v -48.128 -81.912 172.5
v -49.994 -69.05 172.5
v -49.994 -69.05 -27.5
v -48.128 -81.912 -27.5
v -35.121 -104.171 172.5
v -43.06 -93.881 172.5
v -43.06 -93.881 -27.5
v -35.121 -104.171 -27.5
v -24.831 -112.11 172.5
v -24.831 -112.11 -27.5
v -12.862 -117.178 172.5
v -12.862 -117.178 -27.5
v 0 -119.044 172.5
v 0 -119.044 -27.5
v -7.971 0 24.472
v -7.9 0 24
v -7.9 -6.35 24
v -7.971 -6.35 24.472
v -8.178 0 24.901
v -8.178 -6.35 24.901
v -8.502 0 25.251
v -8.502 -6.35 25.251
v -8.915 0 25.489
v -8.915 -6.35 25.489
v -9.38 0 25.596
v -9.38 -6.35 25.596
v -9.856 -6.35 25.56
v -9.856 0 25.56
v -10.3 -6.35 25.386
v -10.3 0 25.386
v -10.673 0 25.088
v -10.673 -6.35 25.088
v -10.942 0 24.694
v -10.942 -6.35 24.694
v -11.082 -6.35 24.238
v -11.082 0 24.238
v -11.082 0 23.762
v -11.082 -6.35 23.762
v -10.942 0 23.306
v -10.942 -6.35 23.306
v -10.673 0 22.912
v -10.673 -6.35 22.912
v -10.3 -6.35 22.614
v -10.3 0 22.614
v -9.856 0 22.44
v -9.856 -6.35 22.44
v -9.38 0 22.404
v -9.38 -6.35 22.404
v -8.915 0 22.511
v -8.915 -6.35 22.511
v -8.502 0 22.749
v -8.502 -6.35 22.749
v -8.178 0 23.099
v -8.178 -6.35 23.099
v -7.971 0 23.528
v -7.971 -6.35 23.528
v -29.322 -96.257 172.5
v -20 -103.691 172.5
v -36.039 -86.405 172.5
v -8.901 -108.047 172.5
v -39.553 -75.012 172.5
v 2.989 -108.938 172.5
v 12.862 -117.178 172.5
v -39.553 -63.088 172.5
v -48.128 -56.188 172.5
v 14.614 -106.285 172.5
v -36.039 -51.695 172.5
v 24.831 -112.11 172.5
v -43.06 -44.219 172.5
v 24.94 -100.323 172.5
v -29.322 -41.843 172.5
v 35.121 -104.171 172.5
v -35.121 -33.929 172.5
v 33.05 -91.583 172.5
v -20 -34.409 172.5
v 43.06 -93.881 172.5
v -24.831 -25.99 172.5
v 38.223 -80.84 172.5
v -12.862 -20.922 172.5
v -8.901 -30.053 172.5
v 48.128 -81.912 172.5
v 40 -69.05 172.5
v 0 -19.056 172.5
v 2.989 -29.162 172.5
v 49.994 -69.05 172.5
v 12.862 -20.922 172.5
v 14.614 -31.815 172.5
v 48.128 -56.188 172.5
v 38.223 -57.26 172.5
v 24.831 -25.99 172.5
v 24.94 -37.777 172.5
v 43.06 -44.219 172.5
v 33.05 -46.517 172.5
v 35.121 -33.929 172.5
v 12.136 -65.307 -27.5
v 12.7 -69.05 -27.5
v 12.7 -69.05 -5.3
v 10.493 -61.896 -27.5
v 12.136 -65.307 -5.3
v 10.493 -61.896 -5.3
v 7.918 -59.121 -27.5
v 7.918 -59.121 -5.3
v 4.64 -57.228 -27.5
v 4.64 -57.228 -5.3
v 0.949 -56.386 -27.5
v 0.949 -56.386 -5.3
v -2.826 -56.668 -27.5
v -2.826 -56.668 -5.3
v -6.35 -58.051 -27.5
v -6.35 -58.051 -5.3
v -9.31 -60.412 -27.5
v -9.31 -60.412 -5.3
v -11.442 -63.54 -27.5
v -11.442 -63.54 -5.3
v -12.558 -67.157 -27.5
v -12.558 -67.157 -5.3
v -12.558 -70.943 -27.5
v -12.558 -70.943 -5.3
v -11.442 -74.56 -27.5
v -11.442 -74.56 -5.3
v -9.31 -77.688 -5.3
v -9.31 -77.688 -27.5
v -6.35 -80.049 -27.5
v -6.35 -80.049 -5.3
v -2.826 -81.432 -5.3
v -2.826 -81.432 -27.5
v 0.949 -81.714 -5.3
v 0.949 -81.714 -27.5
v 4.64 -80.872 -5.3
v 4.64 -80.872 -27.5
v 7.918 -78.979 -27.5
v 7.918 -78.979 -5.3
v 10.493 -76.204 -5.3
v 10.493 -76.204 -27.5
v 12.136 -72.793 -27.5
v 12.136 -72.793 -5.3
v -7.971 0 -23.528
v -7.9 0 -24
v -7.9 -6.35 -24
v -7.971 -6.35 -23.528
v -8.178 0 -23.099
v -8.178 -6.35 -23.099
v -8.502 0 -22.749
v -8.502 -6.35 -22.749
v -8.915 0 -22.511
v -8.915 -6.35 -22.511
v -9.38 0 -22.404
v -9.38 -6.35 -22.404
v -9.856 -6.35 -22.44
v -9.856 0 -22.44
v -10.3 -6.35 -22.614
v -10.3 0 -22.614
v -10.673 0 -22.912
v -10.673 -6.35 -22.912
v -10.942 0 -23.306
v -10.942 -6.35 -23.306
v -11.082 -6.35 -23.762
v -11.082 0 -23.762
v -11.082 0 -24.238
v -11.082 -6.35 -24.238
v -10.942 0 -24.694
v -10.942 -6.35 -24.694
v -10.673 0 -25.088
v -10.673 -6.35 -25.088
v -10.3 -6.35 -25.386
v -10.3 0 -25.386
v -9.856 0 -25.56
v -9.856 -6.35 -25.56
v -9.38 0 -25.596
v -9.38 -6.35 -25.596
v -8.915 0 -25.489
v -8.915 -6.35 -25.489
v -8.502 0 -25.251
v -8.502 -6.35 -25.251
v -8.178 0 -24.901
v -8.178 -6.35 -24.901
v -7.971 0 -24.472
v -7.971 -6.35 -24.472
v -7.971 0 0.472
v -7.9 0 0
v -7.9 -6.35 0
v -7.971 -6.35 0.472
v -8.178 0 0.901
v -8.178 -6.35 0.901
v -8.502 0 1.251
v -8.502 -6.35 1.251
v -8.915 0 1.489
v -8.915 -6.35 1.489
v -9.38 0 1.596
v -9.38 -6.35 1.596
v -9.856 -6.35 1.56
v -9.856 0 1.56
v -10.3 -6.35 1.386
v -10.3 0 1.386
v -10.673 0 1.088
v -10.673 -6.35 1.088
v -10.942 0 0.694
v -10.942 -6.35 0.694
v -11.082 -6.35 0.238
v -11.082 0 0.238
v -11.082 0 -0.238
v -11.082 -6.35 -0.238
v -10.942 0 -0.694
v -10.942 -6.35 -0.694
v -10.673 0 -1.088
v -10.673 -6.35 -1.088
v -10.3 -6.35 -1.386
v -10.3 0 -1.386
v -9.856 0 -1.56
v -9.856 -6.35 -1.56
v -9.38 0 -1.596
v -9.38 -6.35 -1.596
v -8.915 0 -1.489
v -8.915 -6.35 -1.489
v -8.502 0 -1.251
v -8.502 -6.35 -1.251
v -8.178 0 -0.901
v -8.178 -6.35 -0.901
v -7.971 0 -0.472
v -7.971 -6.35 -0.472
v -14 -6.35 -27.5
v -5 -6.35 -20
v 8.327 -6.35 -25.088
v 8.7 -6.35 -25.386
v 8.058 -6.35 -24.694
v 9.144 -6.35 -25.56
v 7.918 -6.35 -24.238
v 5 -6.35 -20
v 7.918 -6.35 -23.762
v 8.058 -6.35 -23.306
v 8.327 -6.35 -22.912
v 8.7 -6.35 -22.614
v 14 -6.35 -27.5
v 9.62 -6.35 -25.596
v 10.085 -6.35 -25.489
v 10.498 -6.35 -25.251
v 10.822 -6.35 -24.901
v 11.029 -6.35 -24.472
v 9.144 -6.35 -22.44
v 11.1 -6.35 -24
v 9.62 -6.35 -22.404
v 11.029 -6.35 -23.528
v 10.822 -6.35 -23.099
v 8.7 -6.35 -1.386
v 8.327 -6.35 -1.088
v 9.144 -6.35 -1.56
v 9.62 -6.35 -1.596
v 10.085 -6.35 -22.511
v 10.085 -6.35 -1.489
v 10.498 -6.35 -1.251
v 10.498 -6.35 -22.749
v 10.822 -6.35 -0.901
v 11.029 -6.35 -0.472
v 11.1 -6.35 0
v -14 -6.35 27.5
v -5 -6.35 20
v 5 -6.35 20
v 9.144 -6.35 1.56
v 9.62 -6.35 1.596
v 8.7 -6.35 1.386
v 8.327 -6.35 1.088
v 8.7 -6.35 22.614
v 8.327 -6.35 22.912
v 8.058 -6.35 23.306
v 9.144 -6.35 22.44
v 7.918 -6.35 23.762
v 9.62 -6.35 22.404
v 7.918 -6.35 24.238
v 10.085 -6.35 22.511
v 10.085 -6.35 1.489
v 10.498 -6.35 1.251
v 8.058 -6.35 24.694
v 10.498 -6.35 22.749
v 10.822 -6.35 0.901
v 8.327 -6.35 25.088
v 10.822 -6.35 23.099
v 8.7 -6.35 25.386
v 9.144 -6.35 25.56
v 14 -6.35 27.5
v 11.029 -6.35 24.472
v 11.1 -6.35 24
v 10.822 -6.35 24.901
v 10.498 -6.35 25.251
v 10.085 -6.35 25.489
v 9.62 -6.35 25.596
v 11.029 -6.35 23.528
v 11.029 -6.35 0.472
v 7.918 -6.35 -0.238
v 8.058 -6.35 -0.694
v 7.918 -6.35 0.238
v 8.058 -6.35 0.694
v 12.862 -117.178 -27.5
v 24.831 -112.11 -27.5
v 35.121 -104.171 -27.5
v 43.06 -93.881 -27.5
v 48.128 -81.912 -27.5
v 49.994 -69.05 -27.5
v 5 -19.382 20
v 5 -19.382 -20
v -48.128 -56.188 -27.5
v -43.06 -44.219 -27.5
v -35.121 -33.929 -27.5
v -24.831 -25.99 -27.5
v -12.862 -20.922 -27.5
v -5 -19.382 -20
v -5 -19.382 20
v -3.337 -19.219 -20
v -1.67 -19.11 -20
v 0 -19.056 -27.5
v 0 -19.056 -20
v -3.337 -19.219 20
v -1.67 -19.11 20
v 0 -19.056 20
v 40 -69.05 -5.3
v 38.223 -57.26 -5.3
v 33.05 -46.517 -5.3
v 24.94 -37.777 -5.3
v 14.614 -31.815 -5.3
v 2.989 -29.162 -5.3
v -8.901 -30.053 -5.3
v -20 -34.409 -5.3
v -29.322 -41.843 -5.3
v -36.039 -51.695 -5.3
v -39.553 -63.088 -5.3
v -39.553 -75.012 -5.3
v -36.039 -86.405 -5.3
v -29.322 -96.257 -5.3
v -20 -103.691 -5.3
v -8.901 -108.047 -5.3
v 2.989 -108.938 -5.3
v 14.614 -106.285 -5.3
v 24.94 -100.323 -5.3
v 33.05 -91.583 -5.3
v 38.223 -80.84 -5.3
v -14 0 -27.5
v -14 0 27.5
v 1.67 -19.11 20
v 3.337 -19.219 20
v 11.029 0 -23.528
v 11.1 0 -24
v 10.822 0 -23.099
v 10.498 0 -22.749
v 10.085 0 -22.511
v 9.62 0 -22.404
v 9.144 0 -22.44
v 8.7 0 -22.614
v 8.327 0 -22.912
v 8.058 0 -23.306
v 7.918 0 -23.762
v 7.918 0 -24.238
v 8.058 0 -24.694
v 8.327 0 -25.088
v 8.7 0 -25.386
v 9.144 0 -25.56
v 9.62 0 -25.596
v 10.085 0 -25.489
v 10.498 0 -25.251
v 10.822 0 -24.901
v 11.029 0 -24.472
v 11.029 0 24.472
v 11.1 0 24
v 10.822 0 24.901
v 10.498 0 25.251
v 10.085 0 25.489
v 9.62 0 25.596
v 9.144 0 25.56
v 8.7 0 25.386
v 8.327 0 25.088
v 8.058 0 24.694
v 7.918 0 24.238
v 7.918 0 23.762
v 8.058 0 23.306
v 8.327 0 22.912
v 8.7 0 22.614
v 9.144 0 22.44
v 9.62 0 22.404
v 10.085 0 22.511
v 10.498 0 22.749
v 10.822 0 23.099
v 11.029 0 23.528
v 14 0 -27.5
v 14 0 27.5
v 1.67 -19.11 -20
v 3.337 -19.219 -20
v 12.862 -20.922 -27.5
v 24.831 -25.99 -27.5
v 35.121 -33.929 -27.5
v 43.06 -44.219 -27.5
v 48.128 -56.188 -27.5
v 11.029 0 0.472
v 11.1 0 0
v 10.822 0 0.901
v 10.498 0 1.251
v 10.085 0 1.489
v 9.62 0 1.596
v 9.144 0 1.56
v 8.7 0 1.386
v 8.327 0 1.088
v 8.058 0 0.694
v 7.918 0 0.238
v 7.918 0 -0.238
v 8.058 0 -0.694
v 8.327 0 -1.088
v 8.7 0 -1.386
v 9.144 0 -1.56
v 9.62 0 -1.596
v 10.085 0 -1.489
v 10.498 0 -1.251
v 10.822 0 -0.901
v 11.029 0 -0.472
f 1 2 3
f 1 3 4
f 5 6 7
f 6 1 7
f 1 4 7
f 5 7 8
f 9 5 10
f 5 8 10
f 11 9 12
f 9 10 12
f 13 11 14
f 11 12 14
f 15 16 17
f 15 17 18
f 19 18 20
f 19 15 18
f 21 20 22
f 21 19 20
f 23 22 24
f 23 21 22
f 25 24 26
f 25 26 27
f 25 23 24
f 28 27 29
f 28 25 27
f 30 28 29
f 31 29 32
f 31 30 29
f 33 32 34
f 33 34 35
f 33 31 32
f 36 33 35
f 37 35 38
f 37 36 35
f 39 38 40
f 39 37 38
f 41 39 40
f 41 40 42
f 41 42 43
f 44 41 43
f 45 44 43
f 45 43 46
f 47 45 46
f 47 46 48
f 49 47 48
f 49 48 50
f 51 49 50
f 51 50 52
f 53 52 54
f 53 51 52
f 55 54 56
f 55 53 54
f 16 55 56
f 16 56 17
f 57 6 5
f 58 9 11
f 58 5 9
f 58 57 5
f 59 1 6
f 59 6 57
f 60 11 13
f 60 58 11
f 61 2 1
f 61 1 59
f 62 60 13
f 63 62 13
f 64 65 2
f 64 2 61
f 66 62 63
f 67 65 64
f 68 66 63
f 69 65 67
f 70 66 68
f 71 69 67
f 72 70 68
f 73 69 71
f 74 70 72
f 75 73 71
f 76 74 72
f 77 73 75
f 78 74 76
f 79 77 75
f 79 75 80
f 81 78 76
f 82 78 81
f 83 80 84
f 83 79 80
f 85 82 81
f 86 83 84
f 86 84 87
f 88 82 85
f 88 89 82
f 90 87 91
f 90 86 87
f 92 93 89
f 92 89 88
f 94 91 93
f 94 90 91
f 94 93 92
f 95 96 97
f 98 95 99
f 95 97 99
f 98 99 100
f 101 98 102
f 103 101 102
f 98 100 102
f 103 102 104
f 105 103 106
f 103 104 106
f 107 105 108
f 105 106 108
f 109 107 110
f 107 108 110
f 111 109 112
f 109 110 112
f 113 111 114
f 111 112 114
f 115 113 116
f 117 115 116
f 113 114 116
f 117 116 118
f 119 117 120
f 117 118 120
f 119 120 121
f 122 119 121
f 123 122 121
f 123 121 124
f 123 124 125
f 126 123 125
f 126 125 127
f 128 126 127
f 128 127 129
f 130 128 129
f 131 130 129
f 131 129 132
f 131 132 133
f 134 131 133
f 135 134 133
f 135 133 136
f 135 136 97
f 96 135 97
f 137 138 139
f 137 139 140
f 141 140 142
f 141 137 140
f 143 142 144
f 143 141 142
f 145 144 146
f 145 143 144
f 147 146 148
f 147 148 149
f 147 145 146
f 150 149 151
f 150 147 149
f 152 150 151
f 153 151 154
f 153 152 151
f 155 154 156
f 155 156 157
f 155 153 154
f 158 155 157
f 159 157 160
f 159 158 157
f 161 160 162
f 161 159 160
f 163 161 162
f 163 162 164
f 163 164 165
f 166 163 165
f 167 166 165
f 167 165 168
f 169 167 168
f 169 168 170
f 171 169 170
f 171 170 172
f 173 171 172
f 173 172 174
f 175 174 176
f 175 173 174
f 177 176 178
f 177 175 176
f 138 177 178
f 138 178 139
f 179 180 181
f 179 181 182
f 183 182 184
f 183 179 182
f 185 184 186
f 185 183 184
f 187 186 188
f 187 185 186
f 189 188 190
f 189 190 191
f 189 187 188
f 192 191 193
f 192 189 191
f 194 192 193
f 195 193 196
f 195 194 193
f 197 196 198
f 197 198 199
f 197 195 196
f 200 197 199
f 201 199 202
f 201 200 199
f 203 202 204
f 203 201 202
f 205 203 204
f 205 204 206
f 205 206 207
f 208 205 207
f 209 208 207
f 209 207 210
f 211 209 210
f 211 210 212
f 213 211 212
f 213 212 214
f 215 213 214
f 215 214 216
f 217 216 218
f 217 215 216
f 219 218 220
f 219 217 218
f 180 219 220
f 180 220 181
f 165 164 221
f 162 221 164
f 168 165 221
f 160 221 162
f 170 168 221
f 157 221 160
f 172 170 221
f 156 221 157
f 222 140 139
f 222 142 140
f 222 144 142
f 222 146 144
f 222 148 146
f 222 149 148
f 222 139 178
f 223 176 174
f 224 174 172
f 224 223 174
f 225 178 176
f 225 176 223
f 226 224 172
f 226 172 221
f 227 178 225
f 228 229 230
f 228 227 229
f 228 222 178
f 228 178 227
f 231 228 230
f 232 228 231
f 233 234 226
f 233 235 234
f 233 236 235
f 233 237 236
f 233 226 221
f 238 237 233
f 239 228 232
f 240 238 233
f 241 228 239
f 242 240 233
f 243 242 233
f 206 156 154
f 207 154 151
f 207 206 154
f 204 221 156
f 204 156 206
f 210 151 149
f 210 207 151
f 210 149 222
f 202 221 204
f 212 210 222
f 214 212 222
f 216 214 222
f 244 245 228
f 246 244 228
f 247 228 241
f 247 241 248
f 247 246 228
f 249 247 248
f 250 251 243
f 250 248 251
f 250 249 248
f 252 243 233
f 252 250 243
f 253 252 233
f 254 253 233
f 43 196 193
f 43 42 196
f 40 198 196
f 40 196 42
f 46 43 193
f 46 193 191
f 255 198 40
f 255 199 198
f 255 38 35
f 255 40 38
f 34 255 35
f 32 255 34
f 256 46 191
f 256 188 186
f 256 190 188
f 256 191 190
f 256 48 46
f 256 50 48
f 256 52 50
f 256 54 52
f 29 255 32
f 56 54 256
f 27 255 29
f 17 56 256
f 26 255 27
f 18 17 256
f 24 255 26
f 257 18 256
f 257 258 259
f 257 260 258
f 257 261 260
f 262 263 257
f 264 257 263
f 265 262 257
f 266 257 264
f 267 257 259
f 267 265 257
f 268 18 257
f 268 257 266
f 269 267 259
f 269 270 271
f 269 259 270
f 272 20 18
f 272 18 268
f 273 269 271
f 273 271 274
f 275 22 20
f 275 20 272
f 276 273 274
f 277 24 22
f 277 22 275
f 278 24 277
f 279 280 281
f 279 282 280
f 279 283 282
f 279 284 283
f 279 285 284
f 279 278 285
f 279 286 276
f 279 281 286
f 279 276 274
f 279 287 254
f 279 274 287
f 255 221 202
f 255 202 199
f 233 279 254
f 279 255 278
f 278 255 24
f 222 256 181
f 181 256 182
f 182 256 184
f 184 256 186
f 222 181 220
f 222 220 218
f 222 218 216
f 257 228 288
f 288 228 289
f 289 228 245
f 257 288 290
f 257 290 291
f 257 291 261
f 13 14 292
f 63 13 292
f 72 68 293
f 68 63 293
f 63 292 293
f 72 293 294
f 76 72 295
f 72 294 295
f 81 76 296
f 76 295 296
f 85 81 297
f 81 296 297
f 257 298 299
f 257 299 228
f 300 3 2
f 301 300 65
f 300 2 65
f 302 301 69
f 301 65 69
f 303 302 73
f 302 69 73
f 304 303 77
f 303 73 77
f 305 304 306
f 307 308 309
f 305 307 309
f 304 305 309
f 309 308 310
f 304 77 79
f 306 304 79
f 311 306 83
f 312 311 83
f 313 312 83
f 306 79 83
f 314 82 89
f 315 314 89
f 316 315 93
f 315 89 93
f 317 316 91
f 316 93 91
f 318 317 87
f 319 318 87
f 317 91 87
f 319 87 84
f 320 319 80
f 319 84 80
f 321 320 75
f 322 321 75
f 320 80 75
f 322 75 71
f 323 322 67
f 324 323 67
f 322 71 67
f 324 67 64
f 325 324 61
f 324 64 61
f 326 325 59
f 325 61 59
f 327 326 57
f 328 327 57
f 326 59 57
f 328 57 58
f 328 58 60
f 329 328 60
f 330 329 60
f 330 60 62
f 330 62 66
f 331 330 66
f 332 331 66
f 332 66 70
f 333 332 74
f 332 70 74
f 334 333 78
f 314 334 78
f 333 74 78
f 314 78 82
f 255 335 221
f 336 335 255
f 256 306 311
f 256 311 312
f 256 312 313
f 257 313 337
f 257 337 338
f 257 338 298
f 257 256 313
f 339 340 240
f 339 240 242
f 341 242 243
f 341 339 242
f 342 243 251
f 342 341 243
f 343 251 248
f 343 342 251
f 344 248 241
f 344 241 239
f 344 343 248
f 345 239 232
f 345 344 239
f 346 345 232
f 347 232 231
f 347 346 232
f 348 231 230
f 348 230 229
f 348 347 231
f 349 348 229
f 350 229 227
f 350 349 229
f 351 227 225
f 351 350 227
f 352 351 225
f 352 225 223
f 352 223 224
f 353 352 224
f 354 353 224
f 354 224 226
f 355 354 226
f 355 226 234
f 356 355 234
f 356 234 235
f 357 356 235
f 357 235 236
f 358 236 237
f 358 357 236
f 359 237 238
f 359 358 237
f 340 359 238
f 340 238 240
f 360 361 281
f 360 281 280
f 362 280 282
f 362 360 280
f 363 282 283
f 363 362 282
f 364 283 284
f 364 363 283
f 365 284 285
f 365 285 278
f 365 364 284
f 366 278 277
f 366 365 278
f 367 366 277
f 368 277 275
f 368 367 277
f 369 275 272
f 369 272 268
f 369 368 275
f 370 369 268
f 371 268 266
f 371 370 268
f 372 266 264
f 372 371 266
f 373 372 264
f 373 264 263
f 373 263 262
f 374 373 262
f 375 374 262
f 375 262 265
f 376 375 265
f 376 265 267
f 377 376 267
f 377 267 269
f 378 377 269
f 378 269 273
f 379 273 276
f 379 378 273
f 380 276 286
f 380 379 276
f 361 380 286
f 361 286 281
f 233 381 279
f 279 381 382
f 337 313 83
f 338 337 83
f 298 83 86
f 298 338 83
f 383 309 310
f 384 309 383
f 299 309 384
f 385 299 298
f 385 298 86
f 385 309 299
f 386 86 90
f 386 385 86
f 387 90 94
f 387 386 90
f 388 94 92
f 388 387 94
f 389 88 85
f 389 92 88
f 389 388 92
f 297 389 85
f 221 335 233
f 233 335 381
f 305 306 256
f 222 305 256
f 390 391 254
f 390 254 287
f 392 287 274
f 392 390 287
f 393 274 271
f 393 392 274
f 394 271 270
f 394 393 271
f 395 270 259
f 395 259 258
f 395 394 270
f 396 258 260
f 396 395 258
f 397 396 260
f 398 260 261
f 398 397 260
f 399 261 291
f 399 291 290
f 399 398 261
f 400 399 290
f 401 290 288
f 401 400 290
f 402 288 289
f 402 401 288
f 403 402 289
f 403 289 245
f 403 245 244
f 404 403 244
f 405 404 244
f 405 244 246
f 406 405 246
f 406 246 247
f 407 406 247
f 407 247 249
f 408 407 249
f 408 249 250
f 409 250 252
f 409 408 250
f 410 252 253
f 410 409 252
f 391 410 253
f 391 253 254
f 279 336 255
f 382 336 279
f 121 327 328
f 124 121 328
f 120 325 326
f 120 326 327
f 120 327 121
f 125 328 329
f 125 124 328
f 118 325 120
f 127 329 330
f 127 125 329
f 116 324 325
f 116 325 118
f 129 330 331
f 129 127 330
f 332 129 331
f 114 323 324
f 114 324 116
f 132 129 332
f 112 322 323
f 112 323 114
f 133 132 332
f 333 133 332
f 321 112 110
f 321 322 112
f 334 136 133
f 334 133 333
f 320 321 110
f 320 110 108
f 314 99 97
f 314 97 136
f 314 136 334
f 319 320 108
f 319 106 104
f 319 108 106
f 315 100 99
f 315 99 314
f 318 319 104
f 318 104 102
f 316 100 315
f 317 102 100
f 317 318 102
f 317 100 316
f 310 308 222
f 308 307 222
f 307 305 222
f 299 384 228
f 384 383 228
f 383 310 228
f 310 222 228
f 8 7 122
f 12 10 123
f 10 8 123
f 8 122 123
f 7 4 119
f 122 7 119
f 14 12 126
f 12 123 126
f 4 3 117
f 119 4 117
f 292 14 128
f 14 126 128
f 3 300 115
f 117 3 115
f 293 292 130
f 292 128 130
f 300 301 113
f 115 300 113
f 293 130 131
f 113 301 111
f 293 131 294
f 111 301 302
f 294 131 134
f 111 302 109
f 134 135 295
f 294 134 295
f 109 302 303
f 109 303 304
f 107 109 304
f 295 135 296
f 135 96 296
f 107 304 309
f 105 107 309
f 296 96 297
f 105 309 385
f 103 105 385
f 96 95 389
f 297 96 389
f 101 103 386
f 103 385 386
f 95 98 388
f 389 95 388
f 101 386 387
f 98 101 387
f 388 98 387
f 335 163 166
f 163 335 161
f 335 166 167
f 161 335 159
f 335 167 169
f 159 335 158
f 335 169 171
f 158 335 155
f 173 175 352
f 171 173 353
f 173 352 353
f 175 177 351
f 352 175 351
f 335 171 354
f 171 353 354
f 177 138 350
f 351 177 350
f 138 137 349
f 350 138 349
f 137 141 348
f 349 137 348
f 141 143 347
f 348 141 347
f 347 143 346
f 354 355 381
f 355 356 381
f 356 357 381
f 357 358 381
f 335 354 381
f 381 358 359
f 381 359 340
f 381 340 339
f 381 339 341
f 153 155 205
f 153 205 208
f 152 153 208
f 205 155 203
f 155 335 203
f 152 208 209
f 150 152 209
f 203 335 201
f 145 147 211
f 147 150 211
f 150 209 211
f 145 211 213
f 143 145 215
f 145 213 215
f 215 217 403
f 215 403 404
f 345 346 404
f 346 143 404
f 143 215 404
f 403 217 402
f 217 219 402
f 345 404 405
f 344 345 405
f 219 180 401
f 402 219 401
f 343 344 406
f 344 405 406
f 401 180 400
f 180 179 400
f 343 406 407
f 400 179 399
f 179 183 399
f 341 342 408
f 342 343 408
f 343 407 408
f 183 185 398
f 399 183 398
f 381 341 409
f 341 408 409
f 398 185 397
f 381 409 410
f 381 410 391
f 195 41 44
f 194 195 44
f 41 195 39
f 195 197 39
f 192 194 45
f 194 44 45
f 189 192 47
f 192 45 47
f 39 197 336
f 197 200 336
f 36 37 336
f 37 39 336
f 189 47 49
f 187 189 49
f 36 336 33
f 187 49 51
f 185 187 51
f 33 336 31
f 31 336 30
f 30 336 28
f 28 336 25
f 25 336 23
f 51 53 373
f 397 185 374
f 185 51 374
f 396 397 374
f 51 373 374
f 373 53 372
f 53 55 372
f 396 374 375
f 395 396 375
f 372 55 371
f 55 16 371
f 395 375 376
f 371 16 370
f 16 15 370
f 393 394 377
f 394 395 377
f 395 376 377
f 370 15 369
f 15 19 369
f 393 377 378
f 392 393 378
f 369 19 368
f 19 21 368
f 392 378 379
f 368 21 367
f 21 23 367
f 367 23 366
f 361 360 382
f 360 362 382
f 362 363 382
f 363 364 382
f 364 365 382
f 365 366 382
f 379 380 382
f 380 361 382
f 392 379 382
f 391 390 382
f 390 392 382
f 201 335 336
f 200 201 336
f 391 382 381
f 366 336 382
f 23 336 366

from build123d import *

# Parameters (mm, degrees)
F0_W          = 28
F0_H          = 55
F0_R          = 1.6
F1_DEPTH      = 6.35
F2_W          = 10
F2_H          = 40
F3_DEPTH      = 12.7
F4_W          = 100
F4_H          = 200
F5_DEPTH      = 100
F6_R          = 40
F7_DEPTH      = 177.8
F8_R          = 12.7
F9_DEPTH      = 41.656
F10_T1_DEPTH  = 454
F10_T6_DEPTH  = 454
F10_T12_DEPTH = 454
F10_T18_DEPTH = 454
F10_T25_DEPTH = 454
F10_T31_DEPTH = 454
F10_T37_DEPTH = 454
F10_T43_DEPTH = 454
F10_T49_DEPTH = 454
F10_T56_DEPTH = 454
F10_T62_DEPTH = 454


# Not quite as in the source:
# - a fillet or chamfer that OpenCascade refuses, or shapes differently, is made with other operations: its cross-section is extruded or revolved along the edge and cut away or added


with BuildPart() as f1:
    # F0 (on Front) → F1 (new body)
    with BuildSketch(Plane.XZ):
        Rectangle(F0_W, F0_H)
        with Locations((-9.5, -24)):
            Circle(F0_R, mode=Mode.SUBTRACT)
        with Locations((9.5, -24)):
            Circle(F0_R, mode=Mode.SUBTRACT)
        with Locations((-9.5, 0)):
            Circle(F0_R, mode=Mode.SUBTRACT)
        with Locations((-9.5, 24)):
            Circle(F0_R, mode=Mode.SUBTRACT)
        with Locations((9.5, 0)):
            Circle(F0_R, mode=Mode.SUBTRACT)
        with Locations((9.5, 24)):
            Circle(F0_R, mode=Mode.SUBTRACT)
    extrude(amount=F1_DEPTH)

    # F2 (on face) → F3 (join)
    with BuildSketch(Plane.XZ.offset(6.35)):
        Rectangle(F2_W, F2_H)
    extrude(amount=F3_DEPTH)

    # F4 (on face) → F5 (join)
    with BuildSketch(Plane.XZ.offset(19.05)):
        with Locations((0, 72.5)):
            Rectangle(F4_W, F4_H)
    extrude(amount=F5_DEPTH)

    # F6 (on face) → F7 (cut)
    with BuildSketch(Plane.XY.offset(172.5)):
        with Locations((0, -69.05)):
            Circle(F6_R)
    extrude(amount=-F7_DEPTH, mode=Mode.SUBTRACT)

    # F8 (on face) → F9 (cut)
    with BuildSketch(Plane.XY.offset(-5.3)):
        with Locations((0, -69.05)):
            Circle(F8_R)
    extrude(amount=-F9_DEPTH, mode=Mode.SUBTRACT)

    # F10: fillet of radius 50.8 on 4 edges, made by hand

    # F10_s2 → F10_t1 (cut)
    with BuildSketch(Plane.XY.offset(-154.5)):
        with BuildLine():
            ThreePointArc((-0.8, -119.05), (35.1210244843, -104.1710244843), (50, -68.25))
            Line((50, -68.25), (50, -119.05))
            Line((50, -119.05), (-0.8, -119.05))
        make_face()
        with BuildLine():
            ThreePointArc((-50, -68.25), (-35.1210244843, -104.1710244843), (0.8, -119.05))
            Line((0.8, -119.05), (-50, -119.05))
            Line((-50, -119.05), (-50, -68.25))
        make_face()
    extrude(amount=F10_T1_DEPTH, mode=Mode.SUBTRACT)


with BuildPart() as f10_tool4:
    # F10_s5 → F10_t6 (new body)
    with BuildSketch(Plane.XY.offset(-154.5)):
        with BuildLine():
            ThreePointArc((-0.8, -19.05), (35.1210244843, -33.9289755157), (50, -69.85))
            Line((50, -69.85), (50, -19.05))
            Line((50, -19.05), (-0.8, -19.05))
        make_face()
    extrude(amount=F10_T6_DEPTH)

    split(bisect_by=Plane.XY.offset(-20), keep=Keep.BOTTOM)

    split(bisect_by=Plane.YZ.offset(5), keep=Keep.BOTTOM)


with BuildPart() as f1_1:
    add(f1.part)

    # F10_t3: cut F10_tool4
    add(f10_tool4.part, mode=Mode.SUBTRACT)


with BuildPart() as f10_tool10:
    # F10_s11 → F10_t12 (new body)
    with BuildSketch(Plane.XY.offset(-154.5)):
        with BuildLine():
            ThreePointArc((-0.8, -19.05), (35.1210244843, -33.9289755157), (50, -69.85))
            Line((50, -69.85), (50, -19.05))
            Line((50, -19.05), (-0.8, -19.05))
        make_face()
    extrude(amount=F10_T12_DEPTH)

    split(bisect_by=Plane.XY.offset(-20), keep=Keep.BOTTOM)

    split(bisect_by=Plane.YZ.offset(5), keep=Keep.TOP)


with BuildPart() as f1_2:
    add(f1_1.part)

    # F10_t9: cut F10_tool10
    add(f10_tool10.part, mode=Mode.SUBTRACT)


with BuildPart() as f10_tool16:
    # F10_s17 → F10_t18 (new body)
    with BuildSketch(Plane.XY.offset(-154.5)):
        with BuildLine():
            ThreePointArc((-0.8, -19.05), (35.1210244843, -33.9289755157), (50, -69.85))
            Line((50, -69.85), (50, -19.05))
            Line((50, -19.05), (-0.8, -19.05))
        make_face()
    extrude(amount=F10_T18_DEPTH)

    split(bisect_by=Plane.XY.offset(20), keep=Keep.BOTTOM)

    split(bisect_by=Plane.XY.offset(-20), keep=Keep.TOP)

    split(bisect_by=Plane.YZ.offset(5), keep=Keep.TOP)


with BuildPart() as f1_3:
    add(f1_2.part)

    # F10_t15: cut F10_tool16
    add(f10_tool16.part, mode=Mode.SUBTRACT)


with BuildPart() as f10_tool23:
    # F10_s24 → F10_t25 (new body)
    with BuildSketch(Plane.XY.offset(-154.5)):
        with BuildLine():
            ThreePointArc((-0.8, -19.05), (35.1210244843, -33.9289755157), (50, -69.85))
            Line((50, -69.85), (50, -19.05))
            Line((50, -19.05), (-0.8, -19.05))
        make_face()
    extrude(amount=F10_T25_DEPTH)

    split(bisect_by=Plane.XY.offset(20), keep=Keep.TOP)

    split(bisect_by=Plane.YZ.offset(5), keep=Keep.BOTTOM)


with BuildPart() as f1_4:
    add(f1_3.part)

    # F10_t22: cut F10_tool23
    add(f10_tool23.part, mode=Mode.SUBTRACT)


with BuildPart() as f10_tool29:
    # F10_s30 → F10_t31 (new body)
    with BuildSketch(Plane.XY.offset(-154.5)):
        with BuildLine():
            ThreePointArc((-0.8, -19.05), (35.1210244843, -33.9289755157), (50, -69.85))
            Line((50, -69.85), (50, -19.05))
            Line((50, -19.05), (-0.8, -19.05))
        make_face()
    extrude(amount=F10_T31_DEPTH)

    split(bisect_by=Plane.XY.offset(20), keep=Keep.TOP)

    split(bisect_by=Plane.YZ.offset(5), keep=Keep.TOP)


with BuildPart() as f1_5:
    add(f1_4.part)

    # F10_t28: cut F10_tool29
    add(f10_tool29.part, mode=Mode.SUBTRACT)


with BuildPart() as f10_tool35:
    # F10_s36 → F10_t37 (new body)
    with BuildSketch(Plane.XY.offset(299.5)):
        with BuildLine():
            ThreePointArc((-50, -69.85), (-35.1210244843, -33.9289755157), (0.8, -19.05))
            Line((0.8, -19.05), (-50, -19.05))
            Line((-50, -19.05), (-50, -69.85))
        make_face()
    extrude(amount=-F10_T37_DEPTH)

    split(bisect_by=Plane.XY.offset(20), keep=Keep.TOP)

    split(bisect_by=Plane.YZ.offset(-5), keep=Keep.BOTTOM)


with BuildPart() as f1_6:
    add(f1_5.part)

    # F10_t34: cut F10_tool35
    add(f10_tool35.part, mode=Mode.SUBTRACT)


with BuildPart() as f10_tool41:
    # F10_s42 → F10_t43 (new body)
    with BuildSketch(Plane.XY.offset(299.5)):
        with BuildLine():
            ThreePointArc((-50, -69.85), (-35.1210244843, -33.9289755157), (0.8, -19.05))
            Line((0.8, -19.05), (-50, -19.05))
            Line((-50, -19.05), (-50, -69.85))
        make_face()
    extrude(amount=-F10_T43_DEPTH)

    split(bisect_by=Plane.XY.offset(20), keep=Keep.TOP)

    split(bisect_by=Plane.YZ.offset(-5), keep=Keep.TOP)


with BuildPart() as f1_7:
    add(f1_6.part)

    # F10_t40: cut F10_tool41
    add(f10_tool41.part, mode=Mode.SUBTRACT)


with BuildPart() as f10_tool47:
    # F10_s48 → F10_t49 (new body)
    with BuildSketch(Plane.XY.offset(299.5)):
        with BuildLine():
            ThreePointArc((-50, -69.85), (-35.1210244843, -33.9289755157), (0.8, -19.05))
            Line((0.8, -19.05), (-50, -19.05))
            Line((-50, -19.05), (-50, -69.85))
        make_face()
    extrude(amount=-F10_T49_DEPTH)

    split(bisect_by=Plane.XY.offset(20), keep=Keep.BOTTOM)

    split(bisect_by=Plane.YZ.offset(-5), keep=Keep.BOTTOM)

    split(bisect_by=Plane.XY.offset(-20), keep=Keep.TOP)


with BuildPart() as f1_8:
    add(f1_7.part)

    # F10_t46: cut F10_tool47
    add(f10_tool47.part, mode=Mode.SUBTRACT)


with BuildPart() as f10_tool54:
    # F10_s55 → F10_t56 (new body)
    with BuildSketch(Plane.XY.offset(299.5)):
        with BuildLine():
            ThreePointArc((-50, -69.85), (-35.1210244843, -33.9289755157), (0.8, -19.05))
            Line((0.8, -19.05), (-50, -19.05))
            Line((-50, -19.05), (-50, -69.85))
        make_face()
    extrude(amount=-F10_T56_DEPTH)

    split(bisect_by=Plane.YZ.offset(-5), keep=Keep.BOTTOM)

    split(bisect_by=Plane.XY.offset(-20), keep=Keep.BOTTOM)


with BuildPart() as f1_9:
    add(f1_8.part)

    # F10_t53: cut F10_tool54
    add(f10_tool54.part, mode=Mode.SUBTRACT)


with BuildPart() as f10_tool60:
    # F10_s61 → F10_t62 (new body)
    with BuildSketch(Plane.XY.offset(299.5)):
        with BuildLine():
            ThreePointArc((-50, -69.85), (-35.1210244843, -33.9289755157), (0.8, -19.05))
            Line((0.8, -19.05), (-50, -19.05))
            Line((-50, -19.05), (-50, -69.85))
        make_face()
    extrude(amount=-F10_T62_DEPTH)

    split(bisect_by=Plane.YZ.offset(-5), keep=Keep.TOP)

    split(bisect_by=Plane.XY.offset(-20), keep=Keep.BOTTOM)


with BuildPart() as f1_10:
    add(f1_9.part)

    # F10_t59: cut F10_tool60
    add(f10_tool60.part, mode=Mode.SUBTRACT)


solid = f1_10.part
